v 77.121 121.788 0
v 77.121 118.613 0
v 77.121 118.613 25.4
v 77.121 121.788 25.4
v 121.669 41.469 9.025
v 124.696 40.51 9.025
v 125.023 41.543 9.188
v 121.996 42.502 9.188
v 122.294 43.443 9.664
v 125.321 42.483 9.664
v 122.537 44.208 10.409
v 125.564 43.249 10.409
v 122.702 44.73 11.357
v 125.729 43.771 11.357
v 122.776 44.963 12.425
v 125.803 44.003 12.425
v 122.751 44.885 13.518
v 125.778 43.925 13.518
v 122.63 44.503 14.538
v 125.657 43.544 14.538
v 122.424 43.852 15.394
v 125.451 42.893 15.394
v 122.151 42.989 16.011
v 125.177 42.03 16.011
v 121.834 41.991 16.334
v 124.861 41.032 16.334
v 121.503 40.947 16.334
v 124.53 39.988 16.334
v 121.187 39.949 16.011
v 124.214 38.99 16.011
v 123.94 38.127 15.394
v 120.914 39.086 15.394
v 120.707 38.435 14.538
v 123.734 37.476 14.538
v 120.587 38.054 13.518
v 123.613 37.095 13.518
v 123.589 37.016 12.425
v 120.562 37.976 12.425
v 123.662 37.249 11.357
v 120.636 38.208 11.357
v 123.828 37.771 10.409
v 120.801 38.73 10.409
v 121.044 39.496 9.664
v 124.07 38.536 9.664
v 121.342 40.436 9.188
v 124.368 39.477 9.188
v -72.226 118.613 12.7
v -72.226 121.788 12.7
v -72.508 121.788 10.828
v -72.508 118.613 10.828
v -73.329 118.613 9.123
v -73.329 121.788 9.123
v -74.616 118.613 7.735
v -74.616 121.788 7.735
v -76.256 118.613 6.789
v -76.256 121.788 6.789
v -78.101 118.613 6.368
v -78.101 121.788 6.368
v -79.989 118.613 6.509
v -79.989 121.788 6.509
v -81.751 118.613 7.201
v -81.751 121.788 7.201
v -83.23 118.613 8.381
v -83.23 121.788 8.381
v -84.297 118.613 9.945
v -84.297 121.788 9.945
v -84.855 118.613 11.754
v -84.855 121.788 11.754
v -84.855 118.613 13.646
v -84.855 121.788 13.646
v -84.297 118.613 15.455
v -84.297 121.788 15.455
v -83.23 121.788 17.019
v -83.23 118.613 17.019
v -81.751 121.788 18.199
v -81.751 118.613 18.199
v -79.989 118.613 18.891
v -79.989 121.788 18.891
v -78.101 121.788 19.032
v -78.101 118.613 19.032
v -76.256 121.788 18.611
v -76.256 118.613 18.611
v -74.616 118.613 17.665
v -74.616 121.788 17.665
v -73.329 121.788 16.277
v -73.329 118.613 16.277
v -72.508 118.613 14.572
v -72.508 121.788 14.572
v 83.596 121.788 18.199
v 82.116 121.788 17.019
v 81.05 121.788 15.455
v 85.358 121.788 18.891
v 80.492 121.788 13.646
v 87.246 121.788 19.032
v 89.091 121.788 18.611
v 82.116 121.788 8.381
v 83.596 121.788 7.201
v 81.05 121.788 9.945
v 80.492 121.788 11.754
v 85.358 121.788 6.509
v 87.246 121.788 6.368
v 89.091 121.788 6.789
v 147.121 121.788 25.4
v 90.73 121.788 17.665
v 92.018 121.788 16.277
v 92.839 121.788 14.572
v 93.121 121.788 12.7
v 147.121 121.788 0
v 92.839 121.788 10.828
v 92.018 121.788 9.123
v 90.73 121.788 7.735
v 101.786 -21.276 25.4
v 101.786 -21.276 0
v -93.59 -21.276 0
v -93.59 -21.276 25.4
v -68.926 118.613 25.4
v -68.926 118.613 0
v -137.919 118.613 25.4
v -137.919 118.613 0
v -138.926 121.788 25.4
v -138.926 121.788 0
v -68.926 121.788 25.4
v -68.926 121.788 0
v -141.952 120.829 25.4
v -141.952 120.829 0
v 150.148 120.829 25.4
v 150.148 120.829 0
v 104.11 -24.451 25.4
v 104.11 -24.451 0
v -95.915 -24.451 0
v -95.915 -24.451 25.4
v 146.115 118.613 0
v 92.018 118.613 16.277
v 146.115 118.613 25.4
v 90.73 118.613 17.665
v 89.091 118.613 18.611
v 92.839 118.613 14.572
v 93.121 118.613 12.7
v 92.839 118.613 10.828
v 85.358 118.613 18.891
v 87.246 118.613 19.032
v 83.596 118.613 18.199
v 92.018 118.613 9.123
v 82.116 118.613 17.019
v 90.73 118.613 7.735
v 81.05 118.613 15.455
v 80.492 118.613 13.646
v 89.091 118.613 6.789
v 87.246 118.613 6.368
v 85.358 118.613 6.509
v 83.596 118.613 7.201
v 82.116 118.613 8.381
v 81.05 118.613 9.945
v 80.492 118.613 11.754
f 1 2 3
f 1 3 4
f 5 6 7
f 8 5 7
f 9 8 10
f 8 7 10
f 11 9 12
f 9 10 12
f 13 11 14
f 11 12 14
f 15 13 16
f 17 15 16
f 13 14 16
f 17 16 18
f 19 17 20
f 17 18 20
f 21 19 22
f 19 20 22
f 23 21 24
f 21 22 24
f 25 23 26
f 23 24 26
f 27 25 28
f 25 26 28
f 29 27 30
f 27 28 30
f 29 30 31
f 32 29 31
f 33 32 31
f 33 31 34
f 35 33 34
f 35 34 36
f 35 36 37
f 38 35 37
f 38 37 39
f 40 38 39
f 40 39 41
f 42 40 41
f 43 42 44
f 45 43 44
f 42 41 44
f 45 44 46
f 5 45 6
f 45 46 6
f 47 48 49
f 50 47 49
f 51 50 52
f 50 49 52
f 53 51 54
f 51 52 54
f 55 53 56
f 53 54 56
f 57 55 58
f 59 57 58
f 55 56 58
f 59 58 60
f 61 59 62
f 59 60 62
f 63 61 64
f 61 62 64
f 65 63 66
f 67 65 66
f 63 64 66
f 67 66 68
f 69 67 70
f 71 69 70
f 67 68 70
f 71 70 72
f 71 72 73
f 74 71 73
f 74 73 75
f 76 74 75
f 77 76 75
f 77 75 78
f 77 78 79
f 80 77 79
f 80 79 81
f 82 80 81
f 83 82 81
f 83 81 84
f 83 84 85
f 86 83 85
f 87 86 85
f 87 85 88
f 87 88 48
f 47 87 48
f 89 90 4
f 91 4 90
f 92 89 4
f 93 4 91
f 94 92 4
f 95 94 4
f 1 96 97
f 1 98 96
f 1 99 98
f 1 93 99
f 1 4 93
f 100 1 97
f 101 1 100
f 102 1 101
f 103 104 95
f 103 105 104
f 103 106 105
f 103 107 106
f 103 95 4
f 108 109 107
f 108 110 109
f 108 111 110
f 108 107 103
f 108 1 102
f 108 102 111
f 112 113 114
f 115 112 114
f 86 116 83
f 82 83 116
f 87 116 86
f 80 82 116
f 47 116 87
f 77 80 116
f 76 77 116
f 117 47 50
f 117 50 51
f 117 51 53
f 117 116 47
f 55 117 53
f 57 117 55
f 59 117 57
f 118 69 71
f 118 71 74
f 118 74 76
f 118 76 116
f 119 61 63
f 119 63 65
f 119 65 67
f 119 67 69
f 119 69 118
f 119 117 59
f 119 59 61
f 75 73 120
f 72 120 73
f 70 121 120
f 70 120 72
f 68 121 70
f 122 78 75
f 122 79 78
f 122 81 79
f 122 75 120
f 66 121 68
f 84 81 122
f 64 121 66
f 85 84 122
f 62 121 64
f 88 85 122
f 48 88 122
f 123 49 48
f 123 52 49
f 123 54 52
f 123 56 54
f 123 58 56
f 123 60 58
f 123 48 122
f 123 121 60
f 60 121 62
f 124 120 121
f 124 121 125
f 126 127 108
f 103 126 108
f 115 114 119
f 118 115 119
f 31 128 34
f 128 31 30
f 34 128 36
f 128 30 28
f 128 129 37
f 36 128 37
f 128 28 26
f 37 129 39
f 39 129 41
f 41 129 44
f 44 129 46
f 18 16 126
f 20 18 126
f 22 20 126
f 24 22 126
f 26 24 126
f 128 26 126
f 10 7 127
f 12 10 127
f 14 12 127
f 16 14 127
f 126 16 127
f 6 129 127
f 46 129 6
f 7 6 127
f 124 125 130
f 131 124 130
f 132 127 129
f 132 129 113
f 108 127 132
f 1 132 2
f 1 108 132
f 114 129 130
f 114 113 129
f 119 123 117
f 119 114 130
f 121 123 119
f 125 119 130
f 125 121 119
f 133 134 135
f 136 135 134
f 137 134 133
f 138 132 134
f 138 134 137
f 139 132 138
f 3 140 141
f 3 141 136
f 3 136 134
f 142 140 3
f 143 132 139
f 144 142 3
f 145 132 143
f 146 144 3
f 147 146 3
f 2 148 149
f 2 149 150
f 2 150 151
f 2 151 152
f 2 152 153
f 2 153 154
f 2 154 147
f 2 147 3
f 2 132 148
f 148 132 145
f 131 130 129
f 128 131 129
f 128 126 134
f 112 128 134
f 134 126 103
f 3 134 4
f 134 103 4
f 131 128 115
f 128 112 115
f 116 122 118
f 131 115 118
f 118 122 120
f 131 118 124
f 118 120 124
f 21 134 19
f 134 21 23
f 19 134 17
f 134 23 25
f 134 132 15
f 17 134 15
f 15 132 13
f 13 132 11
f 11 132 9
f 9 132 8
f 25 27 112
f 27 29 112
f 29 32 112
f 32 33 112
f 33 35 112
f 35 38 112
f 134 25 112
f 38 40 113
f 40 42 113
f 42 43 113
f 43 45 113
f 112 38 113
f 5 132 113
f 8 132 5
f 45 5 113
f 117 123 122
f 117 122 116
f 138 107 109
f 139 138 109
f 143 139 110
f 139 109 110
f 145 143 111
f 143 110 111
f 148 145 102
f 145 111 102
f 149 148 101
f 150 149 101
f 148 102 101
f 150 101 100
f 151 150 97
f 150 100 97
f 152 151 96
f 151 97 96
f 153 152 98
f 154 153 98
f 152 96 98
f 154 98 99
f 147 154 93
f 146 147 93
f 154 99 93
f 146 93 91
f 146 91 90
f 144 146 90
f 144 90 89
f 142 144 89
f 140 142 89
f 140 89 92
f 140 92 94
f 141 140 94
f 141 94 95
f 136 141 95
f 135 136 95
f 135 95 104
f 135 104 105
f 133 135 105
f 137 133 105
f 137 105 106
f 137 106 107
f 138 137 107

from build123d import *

# Parameters (mm, degrees)
BOSS_EXTRUDE1_DEPTH = 25.4
BOSS_EXTRUDE2_DEPTH = 25.4
SKETCH6_R           = 6.35
CUT_EXTRUDE1_DEPTH  = 10
SKETCH7_R           = 3.675
CUT_EXTRUDE2_DEPTH  = 3.175


with BuildPart() as part:
    # Sketch1 → Boss-Extrude1 (new body)
    with BuildSketch(Plane.XY):
        Polygon((-95.914729745, -24.450906393), (104.110270255, -24.450906393), (150.147770255, 120.829197523), (147.121101424, 121.788312106), (101.785788593, -21.275906393), (-93.590248082, -21.275906393), (-138.925560913, 121.788312106), (-141.952229745, 120.829197523), align=None)
    extrude(amount=BOSS_EXTRUDE1_DEPTH)

    # Sketch4 → Boss-Extrude2 (add)
    with BuildSketch(Plane(origin=(0, 0, 0), x_dir=(-1, 0, 0), z_dir=(0, 0, -1))):
        Polygon((-77.121101424, 121.788312106), (-147.121101424, 121.788312106), (-150.147770255, 120.829197523), (-146.114982495, 118.613312106), (-77.121101424, 118.613312106), align=None)
        Polygon((138.925560913, 121.788312106), (68.925560913, 121.788312106), (68.925560913, 118.613312106), (137.919441985, 118.613312106), (141.952229745, 120.829197523), align=None)
    extrude(amount=-BOSS_EXTRUDE2_DEPTH)

    # Sketch6 → Cut-Extrude1 (cut)
    with BuildSketch(Plane(origin=(0, 121.788312106, 0), x_dir=(1, 0, 0), z_dir=(0, 1, 0))):
        with Locations((-78.575560913, -12.7)):
            Circle(SKETCH6_R)
        with Locations((86.771101424, -12.7)):
            Circle(SKETCH6_R)
    extrude(amount=-CUT_EXTRUDE1_DEPTH, mode=Mode.SUBTRACT)

    # Sketch7 → Cut-Extrude2 (cut)
    with BuildSketch(Plane(origin=(101.650894981, -32.211933717, 0), x_dir=(0, 0, -1), z_dir=(0.953281522, -0.302083333, 0))):
        with Locations((-12.7, 76.285872314)):
            Circle(SKETCH7_R)
    extrude(amount=-CUT_EXTRUDE2_DEPTH, mode=Mode.SUBTRACT)


solid = part.part
